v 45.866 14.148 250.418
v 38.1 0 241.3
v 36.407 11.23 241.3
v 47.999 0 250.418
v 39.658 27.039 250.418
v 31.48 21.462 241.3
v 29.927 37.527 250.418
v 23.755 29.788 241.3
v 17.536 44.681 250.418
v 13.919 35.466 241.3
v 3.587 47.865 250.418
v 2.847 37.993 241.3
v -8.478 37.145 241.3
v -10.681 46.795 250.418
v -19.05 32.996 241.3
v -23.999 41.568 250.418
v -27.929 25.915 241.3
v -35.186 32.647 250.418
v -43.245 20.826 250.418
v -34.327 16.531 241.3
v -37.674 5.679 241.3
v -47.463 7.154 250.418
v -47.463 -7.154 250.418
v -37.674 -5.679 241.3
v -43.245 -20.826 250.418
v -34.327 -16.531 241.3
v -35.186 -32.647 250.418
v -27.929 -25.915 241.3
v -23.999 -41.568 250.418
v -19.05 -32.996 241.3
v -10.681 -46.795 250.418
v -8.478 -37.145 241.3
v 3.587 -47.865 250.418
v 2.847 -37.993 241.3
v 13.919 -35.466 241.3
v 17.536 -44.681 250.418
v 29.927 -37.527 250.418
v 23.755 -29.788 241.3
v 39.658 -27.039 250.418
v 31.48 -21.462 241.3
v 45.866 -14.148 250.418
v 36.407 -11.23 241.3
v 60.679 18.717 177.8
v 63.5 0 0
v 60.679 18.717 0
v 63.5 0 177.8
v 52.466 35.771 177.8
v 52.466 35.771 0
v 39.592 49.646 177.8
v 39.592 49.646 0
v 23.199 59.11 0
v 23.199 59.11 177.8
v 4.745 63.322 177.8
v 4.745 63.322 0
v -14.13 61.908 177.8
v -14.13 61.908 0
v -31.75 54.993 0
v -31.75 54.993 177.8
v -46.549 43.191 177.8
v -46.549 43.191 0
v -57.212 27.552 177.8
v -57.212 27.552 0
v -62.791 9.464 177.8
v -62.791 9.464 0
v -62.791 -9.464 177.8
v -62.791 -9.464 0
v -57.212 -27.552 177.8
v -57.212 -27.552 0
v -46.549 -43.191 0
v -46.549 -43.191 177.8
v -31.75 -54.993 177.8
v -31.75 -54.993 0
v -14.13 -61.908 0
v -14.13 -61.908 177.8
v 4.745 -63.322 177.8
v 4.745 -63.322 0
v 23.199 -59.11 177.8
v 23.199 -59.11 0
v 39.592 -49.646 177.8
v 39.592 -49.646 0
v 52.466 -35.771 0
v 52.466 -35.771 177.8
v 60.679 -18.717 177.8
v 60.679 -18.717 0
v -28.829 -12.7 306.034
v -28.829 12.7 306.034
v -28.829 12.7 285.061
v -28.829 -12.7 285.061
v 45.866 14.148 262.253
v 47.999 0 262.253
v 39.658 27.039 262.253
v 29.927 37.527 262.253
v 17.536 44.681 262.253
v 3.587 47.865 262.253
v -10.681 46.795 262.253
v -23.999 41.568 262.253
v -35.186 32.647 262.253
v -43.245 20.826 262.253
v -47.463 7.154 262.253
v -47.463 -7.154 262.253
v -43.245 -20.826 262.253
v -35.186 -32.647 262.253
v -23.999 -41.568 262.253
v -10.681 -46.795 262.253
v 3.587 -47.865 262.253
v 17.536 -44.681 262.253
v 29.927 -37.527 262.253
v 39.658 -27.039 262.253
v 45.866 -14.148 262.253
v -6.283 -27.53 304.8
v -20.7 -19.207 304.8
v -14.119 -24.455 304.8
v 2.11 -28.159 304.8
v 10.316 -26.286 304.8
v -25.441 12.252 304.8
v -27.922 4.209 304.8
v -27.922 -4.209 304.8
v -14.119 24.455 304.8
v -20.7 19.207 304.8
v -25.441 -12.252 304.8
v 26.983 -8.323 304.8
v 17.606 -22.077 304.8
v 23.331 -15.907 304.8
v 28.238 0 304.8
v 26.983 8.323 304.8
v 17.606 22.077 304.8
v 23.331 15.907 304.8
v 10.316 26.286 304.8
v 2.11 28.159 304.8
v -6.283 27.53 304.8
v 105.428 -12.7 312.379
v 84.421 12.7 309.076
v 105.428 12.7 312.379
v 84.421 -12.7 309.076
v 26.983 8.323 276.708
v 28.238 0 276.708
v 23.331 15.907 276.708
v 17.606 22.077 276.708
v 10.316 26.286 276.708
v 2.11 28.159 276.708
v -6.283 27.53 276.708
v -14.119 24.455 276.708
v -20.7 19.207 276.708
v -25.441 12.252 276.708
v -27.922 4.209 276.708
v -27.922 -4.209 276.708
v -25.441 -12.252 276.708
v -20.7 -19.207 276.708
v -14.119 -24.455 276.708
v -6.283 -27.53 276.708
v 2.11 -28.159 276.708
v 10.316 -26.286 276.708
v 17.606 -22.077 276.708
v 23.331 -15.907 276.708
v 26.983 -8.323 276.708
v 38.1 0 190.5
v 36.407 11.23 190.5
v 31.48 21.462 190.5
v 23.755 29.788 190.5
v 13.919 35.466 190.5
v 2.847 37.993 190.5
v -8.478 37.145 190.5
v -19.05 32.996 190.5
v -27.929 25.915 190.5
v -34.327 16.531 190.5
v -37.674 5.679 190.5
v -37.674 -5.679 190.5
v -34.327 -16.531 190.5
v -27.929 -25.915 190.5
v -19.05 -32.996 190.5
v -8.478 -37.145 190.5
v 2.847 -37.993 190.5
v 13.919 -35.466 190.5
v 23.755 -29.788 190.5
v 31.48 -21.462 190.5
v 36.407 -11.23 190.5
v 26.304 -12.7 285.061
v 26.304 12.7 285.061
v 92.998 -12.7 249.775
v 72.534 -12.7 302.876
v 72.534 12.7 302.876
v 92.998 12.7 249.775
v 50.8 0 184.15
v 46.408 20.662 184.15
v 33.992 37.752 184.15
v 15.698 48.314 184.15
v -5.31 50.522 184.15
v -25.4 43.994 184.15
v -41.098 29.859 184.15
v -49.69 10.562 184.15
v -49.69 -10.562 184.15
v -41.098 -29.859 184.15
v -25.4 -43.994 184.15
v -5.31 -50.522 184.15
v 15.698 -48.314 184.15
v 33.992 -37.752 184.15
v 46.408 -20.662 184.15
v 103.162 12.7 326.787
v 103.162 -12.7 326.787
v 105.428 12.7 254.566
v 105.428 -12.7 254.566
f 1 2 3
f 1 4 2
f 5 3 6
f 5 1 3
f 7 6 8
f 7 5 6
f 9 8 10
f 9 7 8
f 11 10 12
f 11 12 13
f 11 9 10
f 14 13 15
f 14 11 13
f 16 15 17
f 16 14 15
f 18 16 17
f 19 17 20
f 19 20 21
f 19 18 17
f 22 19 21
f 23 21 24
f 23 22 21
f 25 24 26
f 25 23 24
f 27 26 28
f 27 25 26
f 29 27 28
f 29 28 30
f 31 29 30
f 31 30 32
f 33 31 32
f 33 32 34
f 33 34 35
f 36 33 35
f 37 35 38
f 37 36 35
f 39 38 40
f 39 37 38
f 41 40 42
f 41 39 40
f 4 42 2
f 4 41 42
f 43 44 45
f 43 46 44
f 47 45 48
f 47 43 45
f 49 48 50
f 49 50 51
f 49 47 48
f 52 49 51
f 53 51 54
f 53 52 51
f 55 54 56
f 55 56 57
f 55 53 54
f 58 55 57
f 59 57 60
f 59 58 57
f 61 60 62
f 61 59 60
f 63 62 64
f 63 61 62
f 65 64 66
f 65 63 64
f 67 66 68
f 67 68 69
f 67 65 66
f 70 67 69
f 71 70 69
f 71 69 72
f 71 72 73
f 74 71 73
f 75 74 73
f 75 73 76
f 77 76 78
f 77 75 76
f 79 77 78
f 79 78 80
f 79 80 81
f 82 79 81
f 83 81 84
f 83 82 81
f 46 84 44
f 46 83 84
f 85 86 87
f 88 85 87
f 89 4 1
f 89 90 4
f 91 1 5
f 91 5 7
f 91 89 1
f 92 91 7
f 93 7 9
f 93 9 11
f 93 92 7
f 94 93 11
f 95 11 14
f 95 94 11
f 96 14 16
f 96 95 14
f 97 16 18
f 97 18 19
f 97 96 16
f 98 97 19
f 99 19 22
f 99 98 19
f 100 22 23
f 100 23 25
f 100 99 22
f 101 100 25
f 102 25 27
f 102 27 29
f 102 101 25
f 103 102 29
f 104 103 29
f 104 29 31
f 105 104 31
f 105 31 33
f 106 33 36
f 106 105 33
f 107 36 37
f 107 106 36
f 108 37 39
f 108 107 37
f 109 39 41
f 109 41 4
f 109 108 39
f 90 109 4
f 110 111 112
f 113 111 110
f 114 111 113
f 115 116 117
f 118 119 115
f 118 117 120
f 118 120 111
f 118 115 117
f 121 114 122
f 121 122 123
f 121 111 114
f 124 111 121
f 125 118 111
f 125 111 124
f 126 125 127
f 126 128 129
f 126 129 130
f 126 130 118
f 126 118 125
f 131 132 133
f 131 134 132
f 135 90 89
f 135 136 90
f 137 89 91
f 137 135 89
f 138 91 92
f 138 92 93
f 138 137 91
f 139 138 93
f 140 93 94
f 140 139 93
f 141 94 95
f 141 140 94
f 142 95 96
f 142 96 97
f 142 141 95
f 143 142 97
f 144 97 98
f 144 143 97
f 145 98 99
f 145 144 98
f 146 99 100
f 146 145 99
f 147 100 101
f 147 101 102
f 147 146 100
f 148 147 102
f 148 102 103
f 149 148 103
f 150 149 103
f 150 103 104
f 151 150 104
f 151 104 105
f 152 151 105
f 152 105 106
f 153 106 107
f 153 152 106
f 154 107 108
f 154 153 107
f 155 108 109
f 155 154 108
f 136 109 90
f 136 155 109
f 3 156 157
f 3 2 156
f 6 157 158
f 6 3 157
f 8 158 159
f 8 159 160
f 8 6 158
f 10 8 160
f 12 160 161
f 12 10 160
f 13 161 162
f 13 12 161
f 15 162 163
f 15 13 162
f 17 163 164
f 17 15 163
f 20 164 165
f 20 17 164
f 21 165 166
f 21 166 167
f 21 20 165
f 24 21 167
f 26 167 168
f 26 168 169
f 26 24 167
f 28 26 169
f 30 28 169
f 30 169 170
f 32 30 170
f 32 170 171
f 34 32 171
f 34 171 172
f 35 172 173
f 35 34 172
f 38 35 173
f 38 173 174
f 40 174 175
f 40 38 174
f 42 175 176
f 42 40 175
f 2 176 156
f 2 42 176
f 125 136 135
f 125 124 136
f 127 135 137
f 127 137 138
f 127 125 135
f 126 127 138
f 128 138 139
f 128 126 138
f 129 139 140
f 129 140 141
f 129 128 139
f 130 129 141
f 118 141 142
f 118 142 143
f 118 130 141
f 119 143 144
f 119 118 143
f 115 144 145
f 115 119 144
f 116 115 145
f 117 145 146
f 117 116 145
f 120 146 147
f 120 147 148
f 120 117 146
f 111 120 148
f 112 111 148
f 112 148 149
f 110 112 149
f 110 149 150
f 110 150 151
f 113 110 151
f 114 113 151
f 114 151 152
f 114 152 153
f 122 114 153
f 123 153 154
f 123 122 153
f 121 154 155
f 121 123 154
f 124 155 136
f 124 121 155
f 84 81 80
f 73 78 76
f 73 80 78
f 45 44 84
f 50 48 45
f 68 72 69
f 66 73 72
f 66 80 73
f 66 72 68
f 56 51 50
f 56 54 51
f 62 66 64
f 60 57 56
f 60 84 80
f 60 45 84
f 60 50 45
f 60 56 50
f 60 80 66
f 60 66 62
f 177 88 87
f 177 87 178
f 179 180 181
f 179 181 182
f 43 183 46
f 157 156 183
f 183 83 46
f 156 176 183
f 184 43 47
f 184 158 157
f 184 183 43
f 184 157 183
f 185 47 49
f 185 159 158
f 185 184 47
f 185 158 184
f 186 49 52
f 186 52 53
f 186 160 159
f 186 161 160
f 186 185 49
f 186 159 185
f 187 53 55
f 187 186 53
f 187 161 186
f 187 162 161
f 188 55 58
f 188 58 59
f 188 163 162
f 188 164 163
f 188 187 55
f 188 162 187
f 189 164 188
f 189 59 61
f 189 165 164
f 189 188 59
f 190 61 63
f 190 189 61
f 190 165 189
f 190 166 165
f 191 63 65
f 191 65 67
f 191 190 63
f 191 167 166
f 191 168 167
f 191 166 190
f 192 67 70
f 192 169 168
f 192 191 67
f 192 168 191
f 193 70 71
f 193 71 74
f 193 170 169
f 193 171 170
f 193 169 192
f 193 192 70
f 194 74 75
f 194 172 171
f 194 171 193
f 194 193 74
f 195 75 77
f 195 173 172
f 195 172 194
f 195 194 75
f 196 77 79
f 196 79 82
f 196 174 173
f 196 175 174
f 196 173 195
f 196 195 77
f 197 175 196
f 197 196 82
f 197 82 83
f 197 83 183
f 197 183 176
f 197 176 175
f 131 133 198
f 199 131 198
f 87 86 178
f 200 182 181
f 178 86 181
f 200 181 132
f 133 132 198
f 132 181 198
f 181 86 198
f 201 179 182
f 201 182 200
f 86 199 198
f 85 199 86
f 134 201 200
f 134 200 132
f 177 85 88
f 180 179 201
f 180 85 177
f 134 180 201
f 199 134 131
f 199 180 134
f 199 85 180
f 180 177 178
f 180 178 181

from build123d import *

# Parameters (mm, degrees)
F3_DEPTH      = 12.7
F3_DEPTH_BACK = 12.7


with BuildPart() as f1:
    # F0 (on Front) → F1 (revolve)
    with BuildSketch(Plane.XZ):
        Polygon((0, 304.8), (0, 0), (63.5, 0), (63.5, 177.8), (38.1, 190.5), (38.1, 241.3), (47.998823, 250.417948), (47.998823, 262.253284), (28.237745, 276.70753), (28.237745, 304.8), align=None)
    revolve(axis=Axis((0, 0, 152.4), (0, 0, 1)))


with BuildPart() as f3:
    # F2 (on Front) → F3 (new body, two sides)
    with BuildSketch(Plane.XZ) as f3_sk:
        Polygon((103.162251, 326.787472), (-28.829439, 306.034058), (-28.829439, 285.060575), (26.303578, 285.060575), (72.533806, 302.876479), (92.99758, 249.775329), (105.427776, 254.565597), (84.420995, 309.075786), (105.427776, 312.37874), align=None)
    extrude(amount=F3_DEPTH)
    extrude(f3_sk.sketch, amount=-F3_DEPTH_BACK)


solid = Compound([f1.part, f3.part])
